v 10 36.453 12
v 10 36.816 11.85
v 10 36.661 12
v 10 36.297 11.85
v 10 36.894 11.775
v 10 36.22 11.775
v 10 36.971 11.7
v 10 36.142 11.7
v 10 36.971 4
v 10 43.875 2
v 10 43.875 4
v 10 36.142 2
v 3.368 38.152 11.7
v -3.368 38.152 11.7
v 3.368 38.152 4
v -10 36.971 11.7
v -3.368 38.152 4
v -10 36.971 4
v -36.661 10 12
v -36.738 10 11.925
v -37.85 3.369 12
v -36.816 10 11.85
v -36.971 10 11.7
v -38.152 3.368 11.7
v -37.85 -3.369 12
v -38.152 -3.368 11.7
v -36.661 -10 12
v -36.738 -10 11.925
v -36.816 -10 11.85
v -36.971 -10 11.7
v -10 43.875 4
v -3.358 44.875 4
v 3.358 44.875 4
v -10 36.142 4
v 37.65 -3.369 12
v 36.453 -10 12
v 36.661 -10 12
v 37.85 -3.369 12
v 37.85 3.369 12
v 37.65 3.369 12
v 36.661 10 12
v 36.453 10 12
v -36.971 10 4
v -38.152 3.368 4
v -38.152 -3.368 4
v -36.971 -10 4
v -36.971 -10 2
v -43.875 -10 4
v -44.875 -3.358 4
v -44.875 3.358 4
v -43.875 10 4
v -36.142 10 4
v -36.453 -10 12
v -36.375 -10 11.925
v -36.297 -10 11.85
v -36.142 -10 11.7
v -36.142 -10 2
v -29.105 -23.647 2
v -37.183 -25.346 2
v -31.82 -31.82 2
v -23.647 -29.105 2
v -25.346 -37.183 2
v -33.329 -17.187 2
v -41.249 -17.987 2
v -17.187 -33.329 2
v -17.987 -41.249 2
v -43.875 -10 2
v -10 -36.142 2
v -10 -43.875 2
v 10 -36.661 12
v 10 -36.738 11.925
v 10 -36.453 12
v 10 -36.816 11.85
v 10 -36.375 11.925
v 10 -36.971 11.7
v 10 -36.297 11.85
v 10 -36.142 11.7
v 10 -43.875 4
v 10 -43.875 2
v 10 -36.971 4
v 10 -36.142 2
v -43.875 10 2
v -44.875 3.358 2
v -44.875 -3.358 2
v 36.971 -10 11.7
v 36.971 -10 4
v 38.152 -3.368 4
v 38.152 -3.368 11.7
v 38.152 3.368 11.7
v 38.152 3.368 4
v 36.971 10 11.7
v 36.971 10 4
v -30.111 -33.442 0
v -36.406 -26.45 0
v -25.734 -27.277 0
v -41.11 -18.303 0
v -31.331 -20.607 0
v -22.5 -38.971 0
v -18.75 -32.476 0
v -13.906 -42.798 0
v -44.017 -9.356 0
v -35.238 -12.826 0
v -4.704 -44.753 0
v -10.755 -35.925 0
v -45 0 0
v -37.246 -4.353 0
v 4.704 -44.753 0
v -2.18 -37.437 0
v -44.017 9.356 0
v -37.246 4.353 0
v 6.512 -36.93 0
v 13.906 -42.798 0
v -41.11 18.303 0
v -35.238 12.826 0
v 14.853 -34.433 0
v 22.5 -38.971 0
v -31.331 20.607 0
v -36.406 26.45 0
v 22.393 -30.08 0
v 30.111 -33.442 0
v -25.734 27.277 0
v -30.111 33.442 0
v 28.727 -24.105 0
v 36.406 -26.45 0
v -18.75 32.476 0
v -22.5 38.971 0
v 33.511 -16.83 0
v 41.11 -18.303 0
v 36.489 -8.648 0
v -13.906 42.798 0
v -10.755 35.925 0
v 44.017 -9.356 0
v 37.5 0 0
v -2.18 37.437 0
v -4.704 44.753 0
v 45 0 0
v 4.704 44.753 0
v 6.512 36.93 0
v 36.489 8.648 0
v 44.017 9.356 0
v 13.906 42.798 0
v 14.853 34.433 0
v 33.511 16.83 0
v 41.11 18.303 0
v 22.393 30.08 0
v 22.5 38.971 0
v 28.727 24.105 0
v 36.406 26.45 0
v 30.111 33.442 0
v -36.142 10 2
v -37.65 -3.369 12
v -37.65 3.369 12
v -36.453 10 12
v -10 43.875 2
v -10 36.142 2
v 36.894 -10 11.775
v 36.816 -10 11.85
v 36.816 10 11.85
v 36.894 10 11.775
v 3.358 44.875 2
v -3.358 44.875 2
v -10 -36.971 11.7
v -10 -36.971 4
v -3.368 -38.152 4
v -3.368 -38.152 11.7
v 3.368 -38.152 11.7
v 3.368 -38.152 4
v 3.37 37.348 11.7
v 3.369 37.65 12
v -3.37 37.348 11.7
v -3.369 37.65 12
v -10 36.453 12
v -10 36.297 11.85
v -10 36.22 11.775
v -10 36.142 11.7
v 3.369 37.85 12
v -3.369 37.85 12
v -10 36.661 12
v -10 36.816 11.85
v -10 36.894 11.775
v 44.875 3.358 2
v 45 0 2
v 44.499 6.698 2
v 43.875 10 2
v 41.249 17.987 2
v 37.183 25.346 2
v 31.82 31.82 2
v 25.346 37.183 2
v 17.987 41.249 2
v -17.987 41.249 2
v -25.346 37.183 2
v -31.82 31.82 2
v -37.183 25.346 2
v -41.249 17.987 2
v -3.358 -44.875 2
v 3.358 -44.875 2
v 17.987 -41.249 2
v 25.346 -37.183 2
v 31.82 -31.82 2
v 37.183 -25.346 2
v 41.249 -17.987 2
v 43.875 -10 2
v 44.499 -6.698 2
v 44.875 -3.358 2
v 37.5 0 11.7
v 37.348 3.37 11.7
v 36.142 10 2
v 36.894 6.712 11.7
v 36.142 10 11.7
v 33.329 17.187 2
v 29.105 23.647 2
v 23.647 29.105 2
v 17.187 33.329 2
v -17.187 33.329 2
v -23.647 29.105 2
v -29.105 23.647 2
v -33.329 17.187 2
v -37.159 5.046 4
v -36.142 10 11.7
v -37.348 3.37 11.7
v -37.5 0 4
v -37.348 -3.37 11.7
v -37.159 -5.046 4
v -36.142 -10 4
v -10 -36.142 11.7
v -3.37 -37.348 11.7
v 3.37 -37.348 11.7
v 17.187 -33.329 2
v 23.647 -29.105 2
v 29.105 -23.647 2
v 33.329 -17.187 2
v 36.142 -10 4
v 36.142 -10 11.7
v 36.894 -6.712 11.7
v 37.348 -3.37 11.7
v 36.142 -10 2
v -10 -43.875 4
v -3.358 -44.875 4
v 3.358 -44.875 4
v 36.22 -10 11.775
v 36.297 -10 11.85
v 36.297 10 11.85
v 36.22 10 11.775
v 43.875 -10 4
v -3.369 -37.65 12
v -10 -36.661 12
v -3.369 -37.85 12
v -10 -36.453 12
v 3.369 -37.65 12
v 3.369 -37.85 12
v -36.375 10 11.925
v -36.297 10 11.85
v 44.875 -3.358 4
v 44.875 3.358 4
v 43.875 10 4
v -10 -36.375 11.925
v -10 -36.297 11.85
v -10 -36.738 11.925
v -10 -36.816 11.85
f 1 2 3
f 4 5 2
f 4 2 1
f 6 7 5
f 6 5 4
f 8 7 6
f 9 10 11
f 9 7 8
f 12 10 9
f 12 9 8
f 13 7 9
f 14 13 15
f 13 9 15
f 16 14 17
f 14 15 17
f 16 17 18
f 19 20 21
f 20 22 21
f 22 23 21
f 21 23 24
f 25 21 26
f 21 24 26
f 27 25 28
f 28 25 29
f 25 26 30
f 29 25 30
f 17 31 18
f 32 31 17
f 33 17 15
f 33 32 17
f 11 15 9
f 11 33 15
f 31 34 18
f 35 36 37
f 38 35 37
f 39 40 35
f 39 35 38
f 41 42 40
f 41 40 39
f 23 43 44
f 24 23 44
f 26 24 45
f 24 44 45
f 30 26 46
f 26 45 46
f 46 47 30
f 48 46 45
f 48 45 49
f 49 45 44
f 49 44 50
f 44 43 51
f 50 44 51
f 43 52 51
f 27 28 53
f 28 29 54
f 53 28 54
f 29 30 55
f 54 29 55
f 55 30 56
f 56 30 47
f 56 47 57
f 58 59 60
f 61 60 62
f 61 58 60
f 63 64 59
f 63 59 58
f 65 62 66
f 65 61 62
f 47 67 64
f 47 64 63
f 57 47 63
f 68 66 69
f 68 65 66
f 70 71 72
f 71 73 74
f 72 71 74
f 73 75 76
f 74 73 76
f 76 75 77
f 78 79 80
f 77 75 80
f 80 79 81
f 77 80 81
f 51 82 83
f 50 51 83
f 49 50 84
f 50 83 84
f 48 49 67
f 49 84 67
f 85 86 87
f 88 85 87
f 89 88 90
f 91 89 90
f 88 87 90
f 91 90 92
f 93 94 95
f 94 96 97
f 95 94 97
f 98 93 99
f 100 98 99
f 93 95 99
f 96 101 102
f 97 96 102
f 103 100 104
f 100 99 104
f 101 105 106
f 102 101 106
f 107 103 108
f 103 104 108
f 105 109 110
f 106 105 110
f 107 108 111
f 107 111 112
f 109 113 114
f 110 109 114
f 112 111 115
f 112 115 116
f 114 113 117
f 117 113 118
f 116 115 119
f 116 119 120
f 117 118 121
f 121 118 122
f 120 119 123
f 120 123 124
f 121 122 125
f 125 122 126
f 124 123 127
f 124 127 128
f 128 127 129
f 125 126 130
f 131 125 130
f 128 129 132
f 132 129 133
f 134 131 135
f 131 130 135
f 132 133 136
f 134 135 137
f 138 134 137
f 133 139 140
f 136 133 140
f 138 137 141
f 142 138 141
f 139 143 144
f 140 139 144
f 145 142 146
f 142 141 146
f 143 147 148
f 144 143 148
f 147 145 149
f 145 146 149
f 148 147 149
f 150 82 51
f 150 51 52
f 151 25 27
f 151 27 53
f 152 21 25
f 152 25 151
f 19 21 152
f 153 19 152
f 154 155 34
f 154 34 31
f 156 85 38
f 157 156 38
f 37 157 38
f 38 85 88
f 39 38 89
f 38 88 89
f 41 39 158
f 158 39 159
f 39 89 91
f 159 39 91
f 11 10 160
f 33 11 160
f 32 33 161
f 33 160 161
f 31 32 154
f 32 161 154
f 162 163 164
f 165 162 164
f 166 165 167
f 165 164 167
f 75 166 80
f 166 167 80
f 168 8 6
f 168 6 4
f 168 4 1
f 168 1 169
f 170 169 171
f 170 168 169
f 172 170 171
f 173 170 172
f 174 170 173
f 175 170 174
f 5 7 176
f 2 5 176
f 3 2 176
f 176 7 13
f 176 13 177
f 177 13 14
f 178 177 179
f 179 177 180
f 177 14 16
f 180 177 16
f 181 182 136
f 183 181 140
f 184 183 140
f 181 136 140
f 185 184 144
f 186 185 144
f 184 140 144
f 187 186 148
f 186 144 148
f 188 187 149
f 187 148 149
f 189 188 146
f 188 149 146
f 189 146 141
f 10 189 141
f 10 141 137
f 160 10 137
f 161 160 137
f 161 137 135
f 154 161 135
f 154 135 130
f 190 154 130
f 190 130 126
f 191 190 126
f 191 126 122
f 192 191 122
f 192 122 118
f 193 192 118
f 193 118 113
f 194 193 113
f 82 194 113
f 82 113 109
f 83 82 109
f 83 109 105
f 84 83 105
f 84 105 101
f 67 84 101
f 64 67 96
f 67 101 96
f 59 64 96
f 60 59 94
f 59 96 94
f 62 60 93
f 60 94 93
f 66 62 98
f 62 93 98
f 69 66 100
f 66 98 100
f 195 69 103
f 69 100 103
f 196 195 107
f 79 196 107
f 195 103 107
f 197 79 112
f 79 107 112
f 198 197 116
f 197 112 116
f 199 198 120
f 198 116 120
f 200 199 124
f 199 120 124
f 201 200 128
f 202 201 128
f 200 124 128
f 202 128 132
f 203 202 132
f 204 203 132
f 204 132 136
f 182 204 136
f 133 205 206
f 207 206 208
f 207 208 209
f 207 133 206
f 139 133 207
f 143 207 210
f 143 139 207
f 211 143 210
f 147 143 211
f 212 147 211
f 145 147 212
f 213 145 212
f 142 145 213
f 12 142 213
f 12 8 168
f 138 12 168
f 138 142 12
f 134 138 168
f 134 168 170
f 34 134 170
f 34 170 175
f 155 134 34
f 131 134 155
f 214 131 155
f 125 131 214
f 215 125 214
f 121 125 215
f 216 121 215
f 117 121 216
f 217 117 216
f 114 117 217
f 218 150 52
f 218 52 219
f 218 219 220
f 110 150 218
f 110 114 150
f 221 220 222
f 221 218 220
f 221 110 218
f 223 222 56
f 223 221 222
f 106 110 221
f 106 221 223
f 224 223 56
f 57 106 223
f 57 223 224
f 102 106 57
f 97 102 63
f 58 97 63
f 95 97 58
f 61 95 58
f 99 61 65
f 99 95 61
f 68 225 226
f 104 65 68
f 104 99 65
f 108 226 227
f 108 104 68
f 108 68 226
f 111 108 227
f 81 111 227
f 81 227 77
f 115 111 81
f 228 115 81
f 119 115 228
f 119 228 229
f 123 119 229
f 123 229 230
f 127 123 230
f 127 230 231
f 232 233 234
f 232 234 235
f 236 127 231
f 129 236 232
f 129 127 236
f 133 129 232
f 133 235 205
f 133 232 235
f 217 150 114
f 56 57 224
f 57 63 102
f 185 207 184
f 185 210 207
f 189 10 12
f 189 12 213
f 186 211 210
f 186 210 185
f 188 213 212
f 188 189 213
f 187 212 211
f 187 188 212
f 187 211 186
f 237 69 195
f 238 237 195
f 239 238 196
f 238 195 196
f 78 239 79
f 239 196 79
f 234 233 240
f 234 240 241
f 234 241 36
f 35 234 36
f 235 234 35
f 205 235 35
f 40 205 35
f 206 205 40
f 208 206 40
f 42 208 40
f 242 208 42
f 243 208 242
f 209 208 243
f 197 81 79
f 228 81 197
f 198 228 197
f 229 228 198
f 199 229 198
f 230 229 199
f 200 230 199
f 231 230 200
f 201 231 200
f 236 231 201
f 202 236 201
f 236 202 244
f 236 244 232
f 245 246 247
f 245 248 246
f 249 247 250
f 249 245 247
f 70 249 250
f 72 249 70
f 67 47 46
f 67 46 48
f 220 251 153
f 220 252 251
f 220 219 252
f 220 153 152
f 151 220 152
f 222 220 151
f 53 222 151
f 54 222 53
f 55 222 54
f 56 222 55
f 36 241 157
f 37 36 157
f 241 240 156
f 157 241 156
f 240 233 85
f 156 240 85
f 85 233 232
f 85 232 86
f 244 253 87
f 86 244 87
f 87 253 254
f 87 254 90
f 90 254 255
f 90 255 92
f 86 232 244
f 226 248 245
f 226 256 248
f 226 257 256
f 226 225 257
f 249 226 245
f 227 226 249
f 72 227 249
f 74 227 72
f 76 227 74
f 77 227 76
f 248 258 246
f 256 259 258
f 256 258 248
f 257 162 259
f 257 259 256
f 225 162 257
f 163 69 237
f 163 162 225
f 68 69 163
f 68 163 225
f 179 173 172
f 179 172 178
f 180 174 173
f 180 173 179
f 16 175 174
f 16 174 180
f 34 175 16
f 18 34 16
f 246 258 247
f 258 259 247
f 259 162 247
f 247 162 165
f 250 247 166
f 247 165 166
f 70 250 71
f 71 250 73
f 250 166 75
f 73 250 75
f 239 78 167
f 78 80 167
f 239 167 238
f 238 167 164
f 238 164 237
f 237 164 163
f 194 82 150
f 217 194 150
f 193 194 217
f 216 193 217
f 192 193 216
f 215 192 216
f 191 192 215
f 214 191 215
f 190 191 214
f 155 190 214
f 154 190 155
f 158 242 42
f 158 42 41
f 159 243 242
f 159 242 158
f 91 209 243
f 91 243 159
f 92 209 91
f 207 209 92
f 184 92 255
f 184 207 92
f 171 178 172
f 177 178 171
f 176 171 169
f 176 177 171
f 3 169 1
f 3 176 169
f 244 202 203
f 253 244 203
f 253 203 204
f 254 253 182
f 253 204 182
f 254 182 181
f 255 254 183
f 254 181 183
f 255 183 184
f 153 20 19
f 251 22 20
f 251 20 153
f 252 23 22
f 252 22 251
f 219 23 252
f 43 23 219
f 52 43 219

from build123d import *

# Parameters (mm, degrees)
SKETCH_R        = 45
SKETCH_R_2      = 37.5
PAD_DEPTH       = 2
SKETCH001_R     = 38.3
SKETCH001_R_2   = 37.5
PAD001_DEPTH    = 10
CHAMFER_SIZE    = 0.3
CHAMFER001_SIZE = 0.3
SKETCH002_W     = 38.775471
SKETCH002_H     = 41.534115
SKETCH002_W_2   = 92.953724
SKETCH002_H_2   = 53.076206
SKETCH002_W_3   = 93.597454
SKETCH002_H_3   = 43.392277
SKETCH002_W_4   = 61.284782
SKETCH002_H_4   = 58.713959
POCKET_DEPTH    = 10.001
PAD002_DEPTH    = 2


with BuildPart() as part:
    # Sketch → Pad (new body)
    with BuildSketch(Plane.XY):
        Circle(SKETCH_R)
        Circle(SKETCH_R_2, mode=Mode.SUBTRACT)
    extrude(amount=PAD_DEPTH)

    # Sketch001 (on Face4 of Pad) → Pad001 (join)
    with BuildSketch(Plane.XY.offset(2)):
        Circle(SKETCH001_R)
        Circle(SKETCH001_R_2, mode=Mode.SUBTRACT)
    extrude(amount=PAD001_DEPTH)

    # Chamfer
    chamfer_edges = [part.edges().sort_by_distance(p)[0] for p in [
        (-37.5, 0, 12),
    ]]
    chamfer(chamfer_edges, length=CHAMFER_SIZE)

    # Chamfer001
    chamfer001_edges = [part.edges().sort_by_distance(p)[0] for p in [
        (-38.3, 0, 12),
    ]]
    chamfer(chamfer001_edges, length=CHAMFER001_SIZE)

    # Sketch002 (on Face6 of Chamfer001) → Pocket (cut, through all)
    with BuildSketch(Plane.XY.offset(2)):
        with Locations((-29.387735, 30.767057)):
            Rectangle(SKETCH002_W, SKETCH002_H)
        with Locations((56.476862, 36.538103)):
            Rectangle(SKETCH002_W_2, SKETCH002_H_2)
        with Locations((56.798727, -31.696138)):
            Rectangle(SKETCH002_W_3, SKETCH002_H_3)
        with Locations((-40.642391, -39.35698)):
            Rectangle(SKETCH002_W_4, SKETCH002_H_4)
    extrude(amount=POCKET_DEPTH, mode=Mode.SUBTRACT)

    # Sketch003 (on Face31 of Pocket) → Pad002 (join)
    with BuildSketch(Plane.XY.offset(2)):
        with BuildLine():
            ThreePointArc((10, 43.874822), (0, 45), (-10, 43.874822))
            Line((-10, 36.142081), (-10, 43.874822))
            ThreePointArc((10, 36.142081), (0, 37.5), (-10, 36.142081))
            Line((10, 43.874822), (10, 36.142081))
        make_face()
        with BuildLine():
            Line((-10, -43.874822), (-10, -36.142081))
            ThreePointArc((-10, -36.142081), (0, -37.5), (10, -36.142081))
            Line((10, -36.142081), (10, -43.874822))
            ThreePointArc((-10, -43.874822), (0, -45), (10, -43.874822))
        make_face()
        with BuildLine():
            Line((-43.874822, 10), (-36.142081, 10))
            ThreePointArc((-36.142081, 10), (-37.5, 0), (-36.142081, -10))
            Line((-36.142081, -10), (-43.874822, -10))
            ThreePointArc((-43.874822, 10), (-45, 0), (-43.874822, -10))
        make_face()
        with BuildLine():
            Line((43.874822, -10), (36.142081, -10))
            ThreePointArc((36.142081, -10), (37.5, 0), (36.142081, 10))
            Line((36.142081, 10), (43.874822, 10))
            ThreePointArc((43.874822, -10), (45, 0), (43.874822, 10))
        make_face()
    extrude(amount=PAD002_DEPTH)


solid = part.part
